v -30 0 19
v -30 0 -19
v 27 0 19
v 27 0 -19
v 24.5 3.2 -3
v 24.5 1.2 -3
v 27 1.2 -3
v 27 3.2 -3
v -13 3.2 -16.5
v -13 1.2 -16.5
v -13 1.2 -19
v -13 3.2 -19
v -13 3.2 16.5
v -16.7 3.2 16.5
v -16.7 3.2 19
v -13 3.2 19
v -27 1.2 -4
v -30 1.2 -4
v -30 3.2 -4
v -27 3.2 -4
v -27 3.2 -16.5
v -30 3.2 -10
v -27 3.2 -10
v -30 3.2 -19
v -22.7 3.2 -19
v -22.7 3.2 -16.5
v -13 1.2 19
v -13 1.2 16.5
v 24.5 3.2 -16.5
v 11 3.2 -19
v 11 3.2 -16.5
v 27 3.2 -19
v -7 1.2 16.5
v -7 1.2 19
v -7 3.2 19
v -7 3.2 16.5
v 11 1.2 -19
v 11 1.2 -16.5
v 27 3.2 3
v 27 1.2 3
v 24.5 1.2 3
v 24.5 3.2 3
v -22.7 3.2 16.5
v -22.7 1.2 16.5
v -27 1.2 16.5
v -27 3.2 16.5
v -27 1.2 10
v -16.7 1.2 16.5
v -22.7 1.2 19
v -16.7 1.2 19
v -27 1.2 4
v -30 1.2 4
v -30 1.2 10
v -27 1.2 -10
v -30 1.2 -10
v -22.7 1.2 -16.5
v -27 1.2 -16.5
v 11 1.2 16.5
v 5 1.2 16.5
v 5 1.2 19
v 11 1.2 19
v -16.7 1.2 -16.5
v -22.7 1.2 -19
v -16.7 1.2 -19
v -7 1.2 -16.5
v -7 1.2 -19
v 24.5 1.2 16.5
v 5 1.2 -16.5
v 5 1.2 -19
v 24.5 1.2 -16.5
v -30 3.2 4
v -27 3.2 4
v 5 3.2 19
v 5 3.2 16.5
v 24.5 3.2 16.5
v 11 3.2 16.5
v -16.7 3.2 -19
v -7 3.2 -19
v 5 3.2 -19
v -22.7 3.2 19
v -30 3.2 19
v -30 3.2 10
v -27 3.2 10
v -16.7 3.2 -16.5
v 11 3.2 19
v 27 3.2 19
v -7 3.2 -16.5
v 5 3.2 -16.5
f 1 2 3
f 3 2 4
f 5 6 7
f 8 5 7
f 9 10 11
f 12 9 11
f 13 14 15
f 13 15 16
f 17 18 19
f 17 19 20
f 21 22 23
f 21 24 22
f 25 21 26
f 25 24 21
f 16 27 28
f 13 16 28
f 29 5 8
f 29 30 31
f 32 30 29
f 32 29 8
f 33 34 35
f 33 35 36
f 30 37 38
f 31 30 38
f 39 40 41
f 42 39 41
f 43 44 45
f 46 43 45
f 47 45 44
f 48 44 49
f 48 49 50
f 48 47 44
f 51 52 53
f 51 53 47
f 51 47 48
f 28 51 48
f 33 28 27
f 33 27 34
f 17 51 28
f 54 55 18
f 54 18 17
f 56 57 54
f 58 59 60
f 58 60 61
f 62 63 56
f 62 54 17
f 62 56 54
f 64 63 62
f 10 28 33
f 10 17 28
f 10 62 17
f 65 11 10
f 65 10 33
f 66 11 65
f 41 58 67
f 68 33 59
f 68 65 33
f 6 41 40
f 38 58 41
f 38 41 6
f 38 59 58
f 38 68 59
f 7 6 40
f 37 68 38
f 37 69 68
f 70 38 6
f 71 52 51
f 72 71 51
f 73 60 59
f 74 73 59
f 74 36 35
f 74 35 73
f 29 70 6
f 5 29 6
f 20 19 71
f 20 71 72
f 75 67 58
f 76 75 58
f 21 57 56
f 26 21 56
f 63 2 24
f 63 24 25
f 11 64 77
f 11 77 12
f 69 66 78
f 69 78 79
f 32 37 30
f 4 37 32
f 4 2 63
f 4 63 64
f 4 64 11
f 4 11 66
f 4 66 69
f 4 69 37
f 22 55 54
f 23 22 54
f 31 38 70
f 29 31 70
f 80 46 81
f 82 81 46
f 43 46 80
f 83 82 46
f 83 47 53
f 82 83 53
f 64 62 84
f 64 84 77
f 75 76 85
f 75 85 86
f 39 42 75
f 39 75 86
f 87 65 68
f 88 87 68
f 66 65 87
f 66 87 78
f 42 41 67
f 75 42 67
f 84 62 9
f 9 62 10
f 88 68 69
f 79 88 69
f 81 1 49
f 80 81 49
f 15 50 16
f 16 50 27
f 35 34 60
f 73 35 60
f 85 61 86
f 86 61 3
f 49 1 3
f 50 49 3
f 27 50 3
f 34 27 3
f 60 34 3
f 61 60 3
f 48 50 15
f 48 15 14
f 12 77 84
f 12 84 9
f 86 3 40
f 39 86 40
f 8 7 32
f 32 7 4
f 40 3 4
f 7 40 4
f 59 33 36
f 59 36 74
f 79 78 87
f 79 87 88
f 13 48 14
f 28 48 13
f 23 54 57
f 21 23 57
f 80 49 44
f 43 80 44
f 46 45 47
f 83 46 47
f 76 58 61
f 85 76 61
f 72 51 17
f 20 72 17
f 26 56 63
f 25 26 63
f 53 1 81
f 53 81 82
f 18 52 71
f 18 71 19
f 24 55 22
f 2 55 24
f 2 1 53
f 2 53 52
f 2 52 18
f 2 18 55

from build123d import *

# Parameters (mm, degrees)
SKETCH1_W           = 57
SKETCH1_H           = 38
BOSS_EXTRUDE1_DEPTH = 1.2
SKETCH3_W           = 3.7
SKETCH3_H           = 2.5
SKETCH3_W_2         = 3
SKETCH3_H_2         = 8
SKETCH3_W_3         = 12
BOSS_EXTRUDE2_DEPTH = 2


with BuildPart() as part:
    # Sketch1 → Boss-Extrude1 (new body)
    with BuildSketch(Plane(origin=(0, 0, 0), x_dir=(1, 0, 0), z_dir=(0, 1, 0))):
        with Locations((-1.5, 0)):
            Rectangle(SKETCH1_W, SKETCH1_H)
    extrude(amount=BOSS_EXTRUDE1_DEPTH)

    # Sketch3 → Boss-Extrude2 (add)
    with BuildSketch(Plane(origin=(0, 1.2, 0), x_dir=(1, 0, 0), z_dir=(0, 1, 0))):
        Polygon((-22.7, -16.5), (-27, -16.5), (-27, -10), (-30, -10), (-30, -19), (-22.7, -19), align=None)
        with Locations((-14.85, -17.75)):
            Rectangle(SKETCH3_W, SKETCH3_H)
        with Locations((-28.5, 0)):
            Rectangle(SKETCH3_W_2, SKETCH3_H_2)
        with Locations((-1, -17.75)):
            Rectangle(SKETCH3_W_3, SKETCH3_H)
        Polygon((11, -16.5), (11, -19), (27, -19), (27, -3), (24.5, -3), (24.5, -16.5), align=None)
        Polygon((24.5, 16.5), (24.5, 3), (27, 3), (27, 19), (11, 19), (11, 16.5), align=None)
        Polygon((-30, 10), (-27, 10), (-27, 16.5), (-22.7, 16.5), (-22.7, 19), (-30, 19), align=None)
        with Locations((-1, 17.75)):
            Rectangle(SKETCH3_W_3, SKETCH3_H)
        with Locations((-14.85, 17.75)):
            Rectangle(SKETCH3_W, SKETCH3_H)
    extrude(amount=BOSS_EXTRUDE2_DEPTH)


solid = part.part
